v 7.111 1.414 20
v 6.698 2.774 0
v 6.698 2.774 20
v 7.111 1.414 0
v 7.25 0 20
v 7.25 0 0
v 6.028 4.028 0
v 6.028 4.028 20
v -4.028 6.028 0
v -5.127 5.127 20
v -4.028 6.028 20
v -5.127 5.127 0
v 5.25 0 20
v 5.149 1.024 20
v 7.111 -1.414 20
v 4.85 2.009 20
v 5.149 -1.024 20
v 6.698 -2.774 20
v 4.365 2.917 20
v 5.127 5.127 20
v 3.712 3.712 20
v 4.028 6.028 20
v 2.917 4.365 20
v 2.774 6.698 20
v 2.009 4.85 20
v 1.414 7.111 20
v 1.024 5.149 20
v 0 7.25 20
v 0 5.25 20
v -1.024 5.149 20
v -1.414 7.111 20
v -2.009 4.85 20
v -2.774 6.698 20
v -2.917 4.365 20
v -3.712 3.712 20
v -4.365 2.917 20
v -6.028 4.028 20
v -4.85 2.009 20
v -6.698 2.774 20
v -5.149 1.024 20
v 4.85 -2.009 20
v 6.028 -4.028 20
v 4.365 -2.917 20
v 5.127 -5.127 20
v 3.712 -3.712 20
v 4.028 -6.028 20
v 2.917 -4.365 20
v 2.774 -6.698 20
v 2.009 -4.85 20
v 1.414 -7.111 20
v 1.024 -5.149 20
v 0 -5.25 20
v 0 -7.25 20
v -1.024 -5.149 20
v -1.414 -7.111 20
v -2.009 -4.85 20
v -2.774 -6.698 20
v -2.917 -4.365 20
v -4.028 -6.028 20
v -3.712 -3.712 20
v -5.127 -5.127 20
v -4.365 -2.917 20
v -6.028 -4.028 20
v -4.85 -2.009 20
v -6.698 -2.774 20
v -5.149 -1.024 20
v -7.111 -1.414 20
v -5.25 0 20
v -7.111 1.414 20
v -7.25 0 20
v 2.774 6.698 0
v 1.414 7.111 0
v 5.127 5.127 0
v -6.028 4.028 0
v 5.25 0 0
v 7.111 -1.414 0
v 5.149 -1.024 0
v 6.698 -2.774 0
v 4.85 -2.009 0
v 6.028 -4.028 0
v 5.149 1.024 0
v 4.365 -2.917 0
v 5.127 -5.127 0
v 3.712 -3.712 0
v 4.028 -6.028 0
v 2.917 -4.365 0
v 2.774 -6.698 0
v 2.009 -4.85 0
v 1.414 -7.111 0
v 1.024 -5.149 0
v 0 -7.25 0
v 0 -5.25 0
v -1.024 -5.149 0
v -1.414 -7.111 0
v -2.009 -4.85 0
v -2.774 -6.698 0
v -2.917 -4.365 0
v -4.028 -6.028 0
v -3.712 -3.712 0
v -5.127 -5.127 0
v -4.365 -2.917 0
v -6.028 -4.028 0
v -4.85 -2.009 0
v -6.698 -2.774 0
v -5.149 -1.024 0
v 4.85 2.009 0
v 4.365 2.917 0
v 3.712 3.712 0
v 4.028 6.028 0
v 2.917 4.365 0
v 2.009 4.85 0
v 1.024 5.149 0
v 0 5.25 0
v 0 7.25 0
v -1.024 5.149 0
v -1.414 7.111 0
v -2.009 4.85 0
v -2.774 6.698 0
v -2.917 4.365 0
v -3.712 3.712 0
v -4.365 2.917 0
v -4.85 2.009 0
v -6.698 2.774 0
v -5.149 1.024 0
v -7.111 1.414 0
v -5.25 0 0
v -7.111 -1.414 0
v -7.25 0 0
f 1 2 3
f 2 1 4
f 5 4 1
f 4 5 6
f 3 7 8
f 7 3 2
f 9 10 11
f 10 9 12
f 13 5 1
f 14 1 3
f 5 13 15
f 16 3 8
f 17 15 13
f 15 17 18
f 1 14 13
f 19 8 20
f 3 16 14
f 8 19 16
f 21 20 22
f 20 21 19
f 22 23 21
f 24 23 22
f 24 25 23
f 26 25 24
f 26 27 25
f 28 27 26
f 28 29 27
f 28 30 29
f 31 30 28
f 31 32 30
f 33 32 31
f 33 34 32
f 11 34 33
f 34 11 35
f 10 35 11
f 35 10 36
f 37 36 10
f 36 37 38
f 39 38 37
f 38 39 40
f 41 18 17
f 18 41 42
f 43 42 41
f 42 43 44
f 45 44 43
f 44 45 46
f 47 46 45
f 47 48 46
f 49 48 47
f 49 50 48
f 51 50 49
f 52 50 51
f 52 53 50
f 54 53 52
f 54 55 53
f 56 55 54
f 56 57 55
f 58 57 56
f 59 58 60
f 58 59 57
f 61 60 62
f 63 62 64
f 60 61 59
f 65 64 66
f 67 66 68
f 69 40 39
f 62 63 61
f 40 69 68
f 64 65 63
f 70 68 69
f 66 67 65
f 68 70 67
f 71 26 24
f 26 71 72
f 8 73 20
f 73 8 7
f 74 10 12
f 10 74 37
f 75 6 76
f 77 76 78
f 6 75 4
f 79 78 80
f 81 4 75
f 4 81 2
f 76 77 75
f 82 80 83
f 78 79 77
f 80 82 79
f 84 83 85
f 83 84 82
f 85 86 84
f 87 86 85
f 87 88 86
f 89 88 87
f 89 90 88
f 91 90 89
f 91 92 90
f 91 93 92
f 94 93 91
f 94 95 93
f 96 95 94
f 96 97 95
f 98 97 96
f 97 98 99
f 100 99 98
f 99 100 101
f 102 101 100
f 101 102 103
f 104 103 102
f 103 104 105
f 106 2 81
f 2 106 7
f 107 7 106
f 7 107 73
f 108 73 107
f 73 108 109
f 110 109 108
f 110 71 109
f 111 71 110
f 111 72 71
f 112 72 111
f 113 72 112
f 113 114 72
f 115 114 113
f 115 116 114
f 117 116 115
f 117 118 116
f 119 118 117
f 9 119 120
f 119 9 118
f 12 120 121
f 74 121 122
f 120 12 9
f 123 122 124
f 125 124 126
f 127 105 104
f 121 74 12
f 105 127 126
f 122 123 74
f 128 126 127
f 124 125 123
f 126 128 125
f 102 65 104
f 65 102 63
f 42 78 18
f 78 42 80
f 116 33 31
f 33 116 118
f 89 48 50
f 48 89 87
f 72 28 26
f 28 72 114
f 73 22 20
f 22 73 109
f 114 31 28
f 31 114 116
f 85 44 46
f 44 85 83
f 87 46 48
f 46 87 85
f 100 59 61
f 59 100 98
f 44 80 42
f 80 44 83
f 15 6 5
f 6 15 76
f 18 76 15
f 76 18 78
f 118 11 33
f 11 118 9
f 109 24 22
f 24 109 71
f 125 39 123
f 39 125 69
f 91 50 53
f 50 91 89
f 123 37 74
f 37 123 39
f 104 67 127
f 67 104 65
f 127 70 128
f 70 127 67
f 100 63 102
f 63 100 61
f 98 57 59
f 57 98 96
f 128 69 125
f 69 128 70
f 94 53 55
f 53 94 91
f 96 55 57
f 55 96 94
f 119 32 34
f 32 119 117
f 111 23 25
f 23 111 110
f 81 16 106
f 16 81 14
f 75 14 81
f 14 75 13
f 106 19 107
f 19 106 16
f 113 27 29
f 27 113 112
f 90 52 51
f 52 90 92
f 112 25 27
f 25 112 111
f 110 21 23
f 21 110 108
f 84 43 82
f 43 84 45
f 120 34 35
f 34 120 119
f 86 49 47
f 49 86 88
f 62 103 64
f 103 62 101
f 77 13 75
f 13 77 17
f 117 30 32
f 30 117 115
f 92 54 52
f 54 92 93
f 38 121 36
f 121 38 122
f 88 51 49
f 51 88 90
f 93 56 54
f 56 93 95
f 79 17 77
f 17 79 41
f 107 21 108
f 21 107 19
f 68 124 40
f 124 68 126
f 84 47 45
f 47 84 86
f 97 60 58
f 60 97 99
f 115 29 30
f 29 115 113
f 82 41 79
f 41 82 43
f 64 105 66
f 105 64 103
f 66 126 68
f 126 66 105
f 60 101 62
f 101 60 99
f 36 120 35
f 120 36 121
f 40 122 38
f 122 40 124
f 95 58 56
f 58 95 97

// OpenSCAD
$fn = 32;

// ----------------------------------------------------------------------
// Spacer sleeve: 14.5 / 10.5 x 20 mm
// ----------------------------------------------------------------------

// --- parameters (mm) ---
tube_d = 14.5;            // outside diameter
bore_d = 10.5;            // shaft bore
tube_l = 20;              // sleeve length

module sleeve() {
  cylinder(h = tube_l, d = tube_d);
}

difference() {
  sleeve();
  translate([0, 0, -1]) cylinder(h = tube_l + 2, d = bore_d);
}
